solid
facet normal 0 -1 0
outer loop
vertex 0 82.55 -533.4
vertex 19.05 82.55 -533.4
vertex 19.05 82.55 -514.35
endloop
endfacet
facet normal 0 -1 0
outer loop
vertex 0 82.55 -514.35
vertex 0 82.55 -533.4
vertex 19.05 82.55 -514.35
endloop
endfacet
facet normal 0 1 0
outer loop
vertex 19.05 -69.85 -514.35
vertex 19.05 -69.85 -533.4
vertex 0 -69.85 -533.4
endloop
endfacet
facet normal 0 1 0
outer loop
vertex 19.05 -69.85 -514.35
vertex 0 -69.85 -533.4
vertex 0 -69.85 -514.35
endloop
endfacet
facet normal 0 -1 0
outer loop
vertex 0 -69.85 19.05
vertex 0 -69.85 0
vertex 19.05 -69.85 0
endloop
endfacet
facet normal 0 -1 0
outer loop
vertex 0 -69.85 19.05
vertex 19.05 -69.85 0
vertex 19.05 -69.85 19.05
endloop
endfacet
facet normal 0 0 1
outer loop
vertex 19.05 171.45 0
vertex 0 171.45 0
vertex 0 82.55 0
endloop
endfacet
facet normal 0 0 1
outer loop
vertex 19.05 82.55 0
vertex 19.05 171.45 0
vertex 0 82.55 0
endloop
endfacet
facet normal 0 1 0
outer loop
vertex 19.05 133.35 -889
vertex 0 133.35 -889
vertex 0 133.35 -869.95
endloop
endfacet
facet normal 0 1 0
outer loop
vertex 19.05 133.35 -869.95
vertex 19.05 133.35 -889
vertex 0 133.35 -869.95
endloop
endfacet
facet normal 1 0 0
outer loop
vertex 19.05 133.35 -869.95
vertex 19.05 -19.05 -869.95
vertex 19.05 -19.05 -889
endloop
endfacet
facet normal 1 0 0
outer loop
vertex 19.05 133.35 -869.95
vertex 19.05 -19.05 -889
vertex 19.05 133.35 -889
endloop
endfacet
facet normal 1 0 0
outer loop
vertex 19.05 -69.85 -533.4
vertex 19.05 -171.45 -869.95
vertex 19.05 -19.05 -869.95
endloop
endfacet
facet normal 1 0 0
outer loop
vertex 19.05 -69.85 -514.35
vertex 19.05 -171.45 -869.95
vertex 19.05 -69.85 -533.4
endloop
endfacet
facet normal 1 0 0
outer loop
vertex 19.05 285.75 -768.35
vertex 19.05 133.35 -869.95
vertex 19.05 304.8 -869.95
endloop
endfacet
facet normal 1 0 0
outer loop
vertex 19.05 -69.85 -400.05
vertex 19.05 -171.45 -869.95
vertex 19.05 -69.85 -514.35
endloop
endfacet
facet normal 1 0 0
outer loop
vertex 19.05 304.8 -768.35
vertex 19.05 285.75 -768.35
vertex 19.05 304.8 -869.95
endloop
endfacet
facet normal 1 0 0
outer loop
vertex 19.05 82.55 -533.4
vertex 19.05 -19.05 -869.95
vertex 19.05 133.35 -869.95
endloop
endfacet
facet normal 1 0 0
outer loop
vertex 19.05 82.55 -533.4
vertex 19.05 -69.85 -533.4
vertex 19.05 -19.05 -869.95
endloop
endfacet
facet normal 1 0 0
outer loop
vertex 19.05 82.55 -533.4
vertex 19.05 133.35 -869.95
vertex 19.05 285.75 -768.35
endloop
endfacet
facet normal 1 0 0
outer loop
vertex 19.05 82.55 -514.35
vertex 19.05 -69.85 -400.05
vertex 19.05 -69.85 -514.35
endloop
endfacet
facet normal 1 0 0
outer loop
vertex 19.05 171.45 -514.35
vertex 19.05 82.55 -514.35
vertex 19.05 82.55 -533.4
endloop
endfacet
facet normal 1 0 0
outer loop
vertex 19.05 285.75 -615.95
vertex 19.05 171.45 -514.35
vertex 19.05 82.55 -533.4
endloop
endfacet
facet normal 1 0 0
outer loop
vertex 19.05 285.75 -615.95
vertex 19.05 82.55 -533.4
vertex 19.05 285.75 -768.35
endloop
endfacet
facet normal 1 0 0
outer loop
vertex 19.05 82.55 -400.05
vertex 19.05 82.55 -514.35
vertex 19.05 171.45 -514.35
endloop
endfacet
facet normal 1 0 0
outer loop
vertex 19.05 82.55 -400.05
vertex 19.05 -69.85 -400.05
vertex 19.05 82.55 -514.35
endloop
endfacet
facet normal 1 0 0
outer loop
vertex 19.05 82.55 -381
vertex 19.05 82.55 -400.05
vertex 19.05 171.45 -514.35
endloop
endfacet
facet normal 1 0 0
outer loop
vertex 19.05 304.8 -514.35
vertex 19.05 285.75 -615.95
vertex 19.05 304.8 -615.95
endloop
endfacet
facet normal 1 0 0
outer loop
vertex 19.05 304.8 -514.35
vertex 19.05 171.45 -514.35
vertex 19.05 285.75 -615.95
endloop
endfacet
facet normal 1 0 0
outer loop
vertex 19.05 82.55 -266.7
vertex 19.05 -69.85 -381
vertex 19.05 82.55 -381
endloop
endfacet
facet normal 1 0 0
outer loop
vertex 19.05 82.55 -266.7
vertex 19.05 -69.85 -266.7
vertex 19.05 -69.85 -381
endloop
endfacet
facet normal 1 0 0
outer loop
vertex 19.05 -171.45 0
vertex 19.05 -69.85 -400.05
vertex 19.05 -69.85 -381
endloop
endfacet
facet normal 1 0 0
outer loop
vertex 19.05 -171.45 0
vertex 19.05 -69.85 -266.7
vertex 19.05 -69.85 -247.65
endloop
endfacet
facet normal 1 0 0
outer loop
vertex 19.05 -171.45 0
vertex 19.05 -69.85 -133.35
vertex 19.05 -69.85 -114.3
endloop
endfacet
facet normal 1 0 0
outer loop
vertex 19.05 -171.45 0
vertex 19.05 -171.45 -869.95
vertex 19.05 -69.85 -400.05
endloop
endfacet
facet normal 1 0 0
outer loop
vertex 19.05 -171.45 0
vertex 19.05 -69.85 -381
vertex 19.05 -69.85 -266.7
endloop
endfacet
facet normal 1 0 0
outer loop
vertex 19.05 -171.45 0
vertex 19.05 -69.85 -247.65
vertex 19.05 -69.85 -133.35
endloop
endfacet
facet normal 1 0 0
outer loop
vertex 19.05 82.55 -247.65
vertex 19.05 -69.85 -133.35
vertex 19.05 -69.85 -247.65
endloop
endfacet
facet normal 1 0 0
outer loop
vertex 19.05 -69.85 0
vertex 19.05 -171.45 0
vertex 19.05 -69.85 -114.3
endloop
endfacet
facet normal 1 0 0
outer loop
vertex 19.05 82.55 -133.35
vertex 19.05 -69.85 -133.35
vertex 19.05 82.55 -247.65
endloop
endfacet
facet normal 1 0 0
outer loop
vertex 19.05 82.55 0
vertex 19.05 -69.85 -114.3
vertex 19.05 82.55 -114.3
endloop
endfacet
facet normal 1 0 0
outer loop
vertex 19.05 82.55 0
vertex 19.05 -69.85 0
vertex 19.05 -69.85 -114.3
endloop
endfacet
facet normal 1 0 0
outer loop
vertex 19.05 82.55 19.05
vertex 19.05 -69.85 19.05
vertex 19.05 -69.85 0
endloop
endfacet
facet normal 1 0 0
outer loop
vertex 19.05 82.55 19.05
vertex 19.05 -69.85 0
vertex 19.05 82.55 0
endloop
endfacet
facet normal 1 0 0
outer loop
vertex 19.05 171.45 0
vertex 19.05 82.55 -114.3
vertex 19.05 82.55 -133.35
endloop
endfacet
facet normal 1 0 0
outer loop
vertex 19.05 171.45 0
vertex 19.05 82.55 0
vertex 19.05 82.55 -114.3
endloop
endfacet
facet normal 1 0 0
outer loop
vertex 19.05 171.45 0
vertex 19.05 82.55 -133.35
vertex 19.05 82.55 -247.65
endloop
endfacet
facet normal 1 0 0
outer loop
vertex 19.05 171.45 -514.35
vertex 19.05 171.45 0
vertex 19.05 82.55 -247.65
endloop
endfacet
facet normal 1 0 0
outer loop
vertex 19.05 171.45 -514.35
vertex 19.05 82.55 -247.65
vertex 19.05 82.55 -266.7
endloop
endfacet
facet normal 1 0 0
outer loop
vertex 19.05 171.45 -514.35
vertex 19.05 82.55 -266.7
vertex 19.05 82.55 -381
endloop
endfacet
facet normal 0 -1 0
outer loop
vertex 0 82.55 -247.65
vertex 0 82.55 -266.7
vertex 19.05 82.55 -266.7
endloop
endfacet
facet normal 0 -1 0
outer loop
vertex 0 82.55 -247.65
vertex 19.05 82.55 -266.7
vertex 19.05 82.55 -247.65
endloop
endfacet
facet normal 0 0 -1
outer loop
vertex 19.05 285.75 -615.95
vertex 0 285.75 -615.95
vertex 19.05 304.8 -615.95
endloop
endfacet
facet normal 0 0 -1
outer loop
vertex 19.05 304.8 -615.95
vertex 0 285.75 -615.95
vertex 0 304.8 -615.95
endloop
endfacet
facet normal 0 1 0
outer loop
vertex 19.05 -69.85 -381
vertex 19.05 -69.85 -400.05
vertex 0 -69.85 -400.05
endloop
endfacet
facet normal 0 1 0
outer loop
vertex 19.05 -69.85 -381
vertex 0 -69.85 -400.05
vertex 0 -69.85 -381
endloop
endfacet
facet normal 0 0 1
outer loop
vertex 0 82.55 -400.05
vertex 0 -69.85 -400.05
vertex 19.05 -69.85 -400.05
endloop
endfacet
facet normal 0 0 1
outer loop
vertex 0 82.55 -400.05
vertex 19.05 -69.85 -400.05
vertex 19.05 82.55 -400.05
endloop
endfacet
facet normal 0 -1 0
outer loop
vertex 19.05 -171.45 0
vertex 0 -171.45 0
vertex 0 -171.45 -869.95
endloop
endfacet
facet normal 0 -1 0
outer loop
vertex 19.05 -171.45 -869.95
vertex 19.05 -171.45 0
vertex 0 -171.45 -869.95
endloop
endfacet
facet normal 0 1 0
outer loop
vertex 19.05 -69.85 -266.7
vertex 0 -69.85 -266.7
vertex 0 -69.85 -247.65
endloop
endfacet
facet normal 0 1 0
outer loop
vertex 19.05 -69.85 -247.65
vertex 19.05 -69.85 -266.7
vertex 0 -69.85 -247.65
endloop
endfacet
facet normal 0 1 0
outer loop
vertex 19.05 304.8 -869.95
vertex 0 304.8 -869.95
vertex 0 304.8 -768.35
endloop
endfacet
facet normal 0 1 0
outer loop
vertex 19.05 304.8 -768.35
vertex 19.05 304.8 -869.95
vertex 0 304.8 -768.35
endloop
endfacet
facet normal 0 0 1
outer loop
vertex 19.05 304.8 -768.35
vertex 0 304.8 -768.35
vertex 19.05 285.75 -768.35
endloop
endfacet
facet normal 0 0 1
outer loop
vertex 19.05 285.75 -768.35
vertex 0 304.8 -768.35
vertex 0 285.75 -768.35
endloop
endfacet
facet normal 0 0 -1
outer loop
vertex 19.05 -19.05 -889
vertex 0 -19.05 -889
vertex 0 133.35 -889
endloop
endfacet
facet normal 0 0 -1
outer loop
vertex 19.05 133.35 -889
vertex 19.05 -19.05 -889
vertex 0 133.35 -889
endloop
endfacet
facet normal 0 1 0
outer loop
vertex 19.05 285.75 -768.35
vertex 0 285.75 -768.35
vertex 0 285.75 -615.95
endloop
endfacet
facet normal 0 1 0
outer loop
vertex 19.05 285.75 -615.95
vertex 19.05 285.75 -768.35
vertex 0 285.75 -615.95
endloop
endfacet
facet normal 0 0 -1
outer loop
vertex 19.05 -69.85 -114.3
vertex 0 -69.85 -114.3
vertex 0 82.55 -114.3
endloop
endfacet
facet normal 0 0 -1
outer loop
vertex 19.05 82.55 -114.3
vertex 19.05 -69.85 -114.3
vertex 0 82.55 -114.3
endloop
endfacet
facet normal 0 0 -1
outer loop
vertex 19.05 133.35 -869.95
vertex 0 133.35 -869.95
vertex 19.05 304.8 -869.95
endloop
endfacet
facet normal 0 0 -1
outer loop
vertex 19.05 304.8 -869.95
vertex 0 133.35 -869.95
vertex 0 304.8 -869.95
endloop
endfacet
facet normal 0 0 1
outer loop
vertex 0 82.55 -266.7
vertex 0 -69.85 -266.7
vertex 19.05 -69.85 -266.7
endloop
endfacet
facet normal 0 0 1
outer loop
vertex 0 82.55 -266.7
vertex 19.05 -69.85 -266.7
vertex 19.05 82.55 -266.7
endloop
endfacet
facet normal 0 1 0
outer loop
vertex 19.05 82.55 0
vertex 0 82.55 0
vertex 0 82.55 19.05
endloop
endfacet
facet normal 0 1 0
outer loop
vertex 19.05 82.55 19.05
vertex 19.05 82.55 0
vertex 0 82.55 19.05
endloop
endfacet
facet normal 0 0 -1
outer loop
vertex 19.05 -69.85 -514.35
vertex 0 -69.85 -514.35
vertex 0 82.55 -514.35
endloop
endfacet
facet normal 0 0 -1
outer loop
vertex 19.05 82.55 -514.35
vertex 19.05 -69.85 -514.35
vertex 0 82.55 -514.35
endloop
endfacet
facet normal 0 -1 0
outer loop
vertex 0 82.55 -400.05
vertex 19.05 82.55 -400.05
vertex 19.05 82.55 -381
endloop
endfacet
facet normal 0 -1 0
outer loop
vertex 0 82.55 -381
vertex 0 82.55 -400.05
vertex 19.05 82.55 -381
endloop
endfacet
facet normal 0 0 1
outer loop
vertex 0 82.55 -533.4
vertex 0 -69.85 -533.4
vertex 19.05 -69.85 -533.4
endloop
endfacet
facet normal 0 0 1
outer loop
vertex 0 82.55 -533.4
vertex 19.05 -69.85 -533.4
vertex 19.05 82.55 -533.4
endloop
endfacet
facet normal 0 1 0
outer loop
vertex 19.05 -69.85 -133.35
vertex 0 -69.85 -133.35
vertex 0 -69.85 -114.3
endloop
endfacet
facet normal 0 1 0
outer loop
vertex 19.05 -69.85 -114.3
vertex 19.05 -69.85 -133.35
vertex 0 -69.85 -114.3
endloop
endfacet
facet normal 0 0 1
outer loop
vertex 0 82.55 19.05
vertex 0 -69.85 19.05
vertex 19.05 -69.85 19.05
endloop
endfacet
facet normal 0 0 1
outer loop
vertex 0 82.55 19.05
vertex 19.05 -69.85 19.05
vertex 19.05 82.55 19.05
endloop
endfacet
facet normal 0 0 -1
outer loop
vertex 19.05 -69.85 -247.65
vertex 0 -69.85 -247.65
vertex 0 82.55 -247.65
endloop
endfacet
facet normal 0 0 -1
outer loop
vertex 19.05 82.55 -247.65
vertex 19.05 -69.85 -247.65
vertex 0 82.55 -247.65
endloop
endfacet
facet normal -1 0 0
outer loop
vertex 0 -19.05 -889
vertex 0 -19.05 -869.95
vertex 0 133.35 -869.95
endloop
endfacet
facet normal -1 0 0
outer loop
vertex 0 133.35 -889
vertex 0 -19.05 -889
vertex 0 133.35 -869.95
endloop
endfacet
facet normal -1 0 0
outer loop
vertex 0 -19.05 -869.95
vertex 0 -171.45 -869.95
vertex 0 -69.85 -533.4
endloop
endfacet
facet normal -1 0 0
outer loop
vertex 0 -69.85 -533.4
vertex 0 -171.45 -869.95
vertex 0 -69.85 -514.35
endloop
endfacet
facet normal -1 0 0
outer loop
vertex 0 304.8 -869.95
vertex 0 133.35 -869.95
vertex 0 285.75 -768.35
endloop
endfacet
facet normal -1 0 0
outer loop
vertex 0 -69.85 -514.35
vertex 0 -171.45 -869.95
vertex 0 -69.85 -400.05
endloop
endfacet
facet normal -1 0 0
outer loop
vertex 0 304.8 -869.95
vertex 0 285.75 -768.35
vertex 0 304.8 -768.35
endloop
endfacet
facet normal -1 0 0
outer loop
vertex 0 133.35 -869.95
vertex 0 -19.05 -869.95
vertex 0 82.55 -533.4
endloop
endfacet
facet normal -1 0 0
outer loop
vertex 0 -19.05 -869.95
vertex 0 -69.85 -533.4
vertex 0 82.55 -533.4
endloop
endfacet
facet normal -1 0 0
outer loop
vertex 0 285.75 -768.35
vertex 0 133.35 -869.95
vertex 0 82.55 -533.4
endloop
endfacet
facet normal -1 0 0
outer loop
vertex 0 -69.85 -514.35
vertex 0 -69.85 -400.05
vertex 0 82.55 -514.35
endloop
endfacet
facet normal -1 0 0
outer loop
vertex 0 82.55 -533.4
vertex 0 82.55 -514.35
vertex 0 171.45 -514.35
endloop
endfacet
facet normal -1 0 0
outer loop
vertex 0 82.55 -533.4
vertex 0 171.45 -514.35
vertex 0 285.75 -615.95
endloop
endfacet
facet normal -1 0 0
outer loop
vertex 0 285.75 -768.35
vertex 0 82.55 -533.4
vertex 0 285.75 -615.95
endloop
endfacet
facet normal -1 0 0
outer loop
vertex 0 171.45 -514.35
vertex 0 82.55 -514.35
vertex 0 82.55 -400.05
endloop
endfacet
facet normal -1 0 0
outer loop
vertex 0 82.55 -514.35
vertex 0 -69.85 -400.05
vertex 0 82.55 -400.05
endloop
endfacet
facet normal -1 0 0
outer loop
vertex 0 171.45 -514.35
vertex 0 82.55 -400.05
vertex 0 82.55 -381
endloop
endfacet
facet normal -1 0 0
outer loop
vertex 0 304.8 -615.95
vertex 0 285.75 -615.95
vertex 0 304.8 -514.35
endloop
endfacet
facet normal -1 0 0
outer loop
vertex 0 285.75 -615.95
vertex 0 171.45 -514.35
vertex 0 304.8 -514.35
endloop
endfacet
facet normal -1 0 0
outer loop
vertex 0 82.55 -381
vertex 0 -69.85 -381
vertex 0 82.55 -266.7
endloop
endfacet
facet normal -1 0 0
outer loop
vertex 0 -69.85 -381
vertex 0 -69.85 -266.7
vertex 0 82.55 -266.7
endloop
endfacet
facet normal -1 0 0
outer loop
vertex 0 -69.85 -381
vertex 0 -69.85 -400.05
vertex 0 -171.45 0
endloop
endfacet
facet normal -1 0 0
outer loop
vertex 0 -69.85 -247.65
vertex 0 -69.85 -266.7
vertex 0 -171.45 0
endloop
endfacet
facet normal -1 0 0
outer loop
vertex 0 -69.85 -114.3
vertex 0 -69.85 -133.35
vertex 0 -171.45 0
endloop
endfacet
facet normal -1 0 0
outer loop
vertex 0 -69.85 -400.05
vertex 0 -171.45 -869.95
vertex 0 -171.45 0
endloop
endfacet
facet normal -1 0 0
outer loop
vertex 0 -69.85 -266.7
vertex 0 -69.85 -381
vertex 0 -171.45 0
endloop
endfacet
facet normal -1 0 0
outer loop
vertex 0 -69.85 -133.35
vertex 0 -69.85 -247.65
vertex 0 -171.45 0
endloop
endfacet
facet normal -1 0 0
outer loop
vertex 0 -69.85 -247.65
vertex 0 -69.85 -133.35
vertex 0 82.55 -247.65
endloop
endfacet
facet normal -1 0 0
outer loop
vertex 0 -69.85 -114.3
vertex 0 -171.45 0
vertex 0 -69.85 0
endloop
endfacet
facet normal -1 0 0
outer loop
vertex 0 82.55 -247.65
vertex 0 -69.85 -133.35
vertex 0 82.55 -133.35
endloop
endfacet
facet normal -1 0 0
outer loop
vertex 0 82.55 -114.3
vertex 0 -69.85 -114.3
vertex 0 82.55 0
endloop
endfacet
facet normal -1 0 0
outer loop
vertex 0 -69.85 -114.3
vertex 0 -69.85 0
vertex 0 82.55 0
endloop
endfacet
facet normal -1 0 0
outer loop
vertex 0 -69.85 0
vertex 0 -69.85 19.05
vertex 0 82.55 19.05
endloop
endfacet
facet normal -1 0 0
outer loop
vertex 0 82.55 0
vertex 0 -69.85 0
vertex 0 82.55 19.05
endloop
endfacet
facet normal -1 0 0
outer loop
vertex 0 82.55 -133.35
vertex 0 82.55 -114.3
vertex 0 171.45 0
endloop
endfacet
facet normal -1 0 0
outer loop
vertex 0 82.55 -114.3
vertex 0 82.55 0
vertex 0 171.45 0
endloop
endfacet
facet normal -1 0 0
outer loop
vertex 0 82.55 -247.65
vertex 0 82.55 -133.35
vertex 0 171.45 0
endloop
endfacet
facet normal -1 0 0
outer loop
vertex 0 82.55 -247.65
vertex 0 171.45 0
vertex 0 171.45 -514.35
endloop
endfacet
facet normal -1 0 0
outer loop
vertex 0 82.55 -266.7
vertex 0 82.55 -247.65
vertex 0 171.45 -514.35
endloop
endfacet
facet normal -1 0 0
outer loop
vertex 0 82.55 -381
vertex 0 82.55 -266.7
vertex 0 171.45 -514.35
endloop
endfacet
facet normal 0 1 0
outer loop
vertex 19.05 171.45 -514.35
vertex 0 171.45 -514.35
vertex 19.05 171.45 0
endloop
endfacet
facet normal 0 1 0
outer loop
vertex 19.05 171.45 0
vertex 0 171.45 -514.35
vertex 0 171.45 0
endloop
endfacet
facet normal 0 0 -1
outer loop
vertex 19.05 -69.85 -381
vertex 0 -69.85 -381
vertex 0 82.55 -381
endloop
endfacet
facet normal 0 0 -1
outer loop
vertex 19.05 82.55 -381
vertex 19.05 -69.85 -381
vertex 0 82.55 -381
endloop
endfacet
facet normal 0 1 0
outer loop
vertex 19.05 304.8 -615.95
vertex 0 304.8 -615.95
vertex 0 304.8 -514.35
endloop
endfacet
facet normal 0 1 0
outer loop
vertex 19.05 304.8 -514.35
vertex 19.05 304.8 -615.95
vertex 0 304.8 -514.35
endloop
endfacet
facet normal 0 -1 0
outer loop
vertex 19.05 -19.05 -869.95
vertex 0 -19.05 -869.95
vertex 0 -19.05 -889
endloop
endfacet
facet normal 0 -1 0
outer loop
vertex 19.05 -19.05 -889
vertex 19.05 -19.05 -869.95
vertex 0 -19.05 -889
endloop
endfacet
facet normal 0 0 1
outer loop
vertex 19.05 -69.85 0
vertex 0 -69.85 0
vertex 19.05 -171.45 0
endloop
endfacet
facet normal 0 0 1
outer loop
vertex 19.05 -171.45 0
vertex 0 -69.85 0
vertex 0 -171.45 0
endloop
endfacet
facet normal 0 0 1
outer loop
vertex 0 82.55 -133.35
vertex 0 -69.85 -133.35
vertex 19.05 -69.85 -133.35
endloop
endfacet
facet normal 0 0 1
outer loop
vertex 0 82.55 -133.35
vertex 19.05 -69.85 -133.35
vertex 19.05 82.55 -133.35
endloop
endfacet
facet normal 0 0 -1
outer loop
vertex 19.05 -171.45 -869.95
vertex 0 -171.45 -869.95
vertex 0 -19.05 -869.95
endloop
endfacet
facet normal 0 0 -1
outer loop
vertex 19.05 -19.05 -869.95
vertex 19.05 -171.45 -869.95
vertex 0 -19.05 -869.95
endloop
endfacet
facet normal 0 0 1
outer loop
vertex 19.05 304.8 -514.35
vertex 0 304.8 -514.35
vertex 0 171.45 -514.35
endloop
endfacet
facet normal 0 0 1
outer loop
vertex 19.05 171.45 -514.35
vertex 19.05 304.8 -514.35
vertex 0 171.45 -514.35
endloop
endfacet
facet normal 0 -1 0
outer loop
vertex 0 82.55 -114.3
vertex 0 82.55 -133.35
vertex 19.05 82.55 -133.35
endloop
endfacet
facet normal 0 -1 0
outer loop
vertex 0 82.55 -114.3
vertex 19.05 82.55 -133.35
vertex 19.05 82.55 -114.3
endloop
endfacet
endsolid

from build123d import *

# Parameters (mm, degrees)
F0_W     = 152.4
F0_H     = 19.05
F1_DEPTH = 19.05


# Not quite as in the source:
# - a feature names something its author has since deleted; it is built from what else it names


with BuildPart() as f1:
    # F0 (on Right) → F1 (new body)
    with BuildSketch(Plane.YZ):
        Polygon((-69.85, 0), (-171.45, 0), (-171.45, -869.95), (-19.05, -869.95), (40.3552334547, -869.95), (133.35, -869.95), (171.45, -869.95), (171.45, -514.35), (171.45, 0), (82.55, 0), align=None)
        with Locations((6.35, -523.875)):
            Rectangle(F0_W, F0_H, mode=Mode.SUBTRACT)
        with Locations((6.35, -390.525)):
            Rectangle(F0_W, F0_H, mode=Mode.SUBTRACT)
        with Locations((6.35, -257.175)):
            Rectangle(F0_W, F0_H, mode=Mode.SUBTRACT)
        with Locations((6.35, -123.825)):
            Rectangle(F0_W, F0_H, mode=Mode.SUBTRACT)
        Polygon((40.3552334547, -869.95), (-19.05, -869.95), (-19.05, -889), (133.35, -889), (133.35, -869.95), align=None)
        Polygon((304.8, -514.35), (171.45, -514.35), (171.45, -869.95), (304.8, -869.95), (304.8, -768.35), (285.75, -768.35), (285.75, -615.95), (304.8, -615.95), align=None)
        with Locations((6.35, 9.525)):
            Rectangle(F0_W, F0_H)
    extrude(amount=F1_DEPTH)


solid = f1.part
